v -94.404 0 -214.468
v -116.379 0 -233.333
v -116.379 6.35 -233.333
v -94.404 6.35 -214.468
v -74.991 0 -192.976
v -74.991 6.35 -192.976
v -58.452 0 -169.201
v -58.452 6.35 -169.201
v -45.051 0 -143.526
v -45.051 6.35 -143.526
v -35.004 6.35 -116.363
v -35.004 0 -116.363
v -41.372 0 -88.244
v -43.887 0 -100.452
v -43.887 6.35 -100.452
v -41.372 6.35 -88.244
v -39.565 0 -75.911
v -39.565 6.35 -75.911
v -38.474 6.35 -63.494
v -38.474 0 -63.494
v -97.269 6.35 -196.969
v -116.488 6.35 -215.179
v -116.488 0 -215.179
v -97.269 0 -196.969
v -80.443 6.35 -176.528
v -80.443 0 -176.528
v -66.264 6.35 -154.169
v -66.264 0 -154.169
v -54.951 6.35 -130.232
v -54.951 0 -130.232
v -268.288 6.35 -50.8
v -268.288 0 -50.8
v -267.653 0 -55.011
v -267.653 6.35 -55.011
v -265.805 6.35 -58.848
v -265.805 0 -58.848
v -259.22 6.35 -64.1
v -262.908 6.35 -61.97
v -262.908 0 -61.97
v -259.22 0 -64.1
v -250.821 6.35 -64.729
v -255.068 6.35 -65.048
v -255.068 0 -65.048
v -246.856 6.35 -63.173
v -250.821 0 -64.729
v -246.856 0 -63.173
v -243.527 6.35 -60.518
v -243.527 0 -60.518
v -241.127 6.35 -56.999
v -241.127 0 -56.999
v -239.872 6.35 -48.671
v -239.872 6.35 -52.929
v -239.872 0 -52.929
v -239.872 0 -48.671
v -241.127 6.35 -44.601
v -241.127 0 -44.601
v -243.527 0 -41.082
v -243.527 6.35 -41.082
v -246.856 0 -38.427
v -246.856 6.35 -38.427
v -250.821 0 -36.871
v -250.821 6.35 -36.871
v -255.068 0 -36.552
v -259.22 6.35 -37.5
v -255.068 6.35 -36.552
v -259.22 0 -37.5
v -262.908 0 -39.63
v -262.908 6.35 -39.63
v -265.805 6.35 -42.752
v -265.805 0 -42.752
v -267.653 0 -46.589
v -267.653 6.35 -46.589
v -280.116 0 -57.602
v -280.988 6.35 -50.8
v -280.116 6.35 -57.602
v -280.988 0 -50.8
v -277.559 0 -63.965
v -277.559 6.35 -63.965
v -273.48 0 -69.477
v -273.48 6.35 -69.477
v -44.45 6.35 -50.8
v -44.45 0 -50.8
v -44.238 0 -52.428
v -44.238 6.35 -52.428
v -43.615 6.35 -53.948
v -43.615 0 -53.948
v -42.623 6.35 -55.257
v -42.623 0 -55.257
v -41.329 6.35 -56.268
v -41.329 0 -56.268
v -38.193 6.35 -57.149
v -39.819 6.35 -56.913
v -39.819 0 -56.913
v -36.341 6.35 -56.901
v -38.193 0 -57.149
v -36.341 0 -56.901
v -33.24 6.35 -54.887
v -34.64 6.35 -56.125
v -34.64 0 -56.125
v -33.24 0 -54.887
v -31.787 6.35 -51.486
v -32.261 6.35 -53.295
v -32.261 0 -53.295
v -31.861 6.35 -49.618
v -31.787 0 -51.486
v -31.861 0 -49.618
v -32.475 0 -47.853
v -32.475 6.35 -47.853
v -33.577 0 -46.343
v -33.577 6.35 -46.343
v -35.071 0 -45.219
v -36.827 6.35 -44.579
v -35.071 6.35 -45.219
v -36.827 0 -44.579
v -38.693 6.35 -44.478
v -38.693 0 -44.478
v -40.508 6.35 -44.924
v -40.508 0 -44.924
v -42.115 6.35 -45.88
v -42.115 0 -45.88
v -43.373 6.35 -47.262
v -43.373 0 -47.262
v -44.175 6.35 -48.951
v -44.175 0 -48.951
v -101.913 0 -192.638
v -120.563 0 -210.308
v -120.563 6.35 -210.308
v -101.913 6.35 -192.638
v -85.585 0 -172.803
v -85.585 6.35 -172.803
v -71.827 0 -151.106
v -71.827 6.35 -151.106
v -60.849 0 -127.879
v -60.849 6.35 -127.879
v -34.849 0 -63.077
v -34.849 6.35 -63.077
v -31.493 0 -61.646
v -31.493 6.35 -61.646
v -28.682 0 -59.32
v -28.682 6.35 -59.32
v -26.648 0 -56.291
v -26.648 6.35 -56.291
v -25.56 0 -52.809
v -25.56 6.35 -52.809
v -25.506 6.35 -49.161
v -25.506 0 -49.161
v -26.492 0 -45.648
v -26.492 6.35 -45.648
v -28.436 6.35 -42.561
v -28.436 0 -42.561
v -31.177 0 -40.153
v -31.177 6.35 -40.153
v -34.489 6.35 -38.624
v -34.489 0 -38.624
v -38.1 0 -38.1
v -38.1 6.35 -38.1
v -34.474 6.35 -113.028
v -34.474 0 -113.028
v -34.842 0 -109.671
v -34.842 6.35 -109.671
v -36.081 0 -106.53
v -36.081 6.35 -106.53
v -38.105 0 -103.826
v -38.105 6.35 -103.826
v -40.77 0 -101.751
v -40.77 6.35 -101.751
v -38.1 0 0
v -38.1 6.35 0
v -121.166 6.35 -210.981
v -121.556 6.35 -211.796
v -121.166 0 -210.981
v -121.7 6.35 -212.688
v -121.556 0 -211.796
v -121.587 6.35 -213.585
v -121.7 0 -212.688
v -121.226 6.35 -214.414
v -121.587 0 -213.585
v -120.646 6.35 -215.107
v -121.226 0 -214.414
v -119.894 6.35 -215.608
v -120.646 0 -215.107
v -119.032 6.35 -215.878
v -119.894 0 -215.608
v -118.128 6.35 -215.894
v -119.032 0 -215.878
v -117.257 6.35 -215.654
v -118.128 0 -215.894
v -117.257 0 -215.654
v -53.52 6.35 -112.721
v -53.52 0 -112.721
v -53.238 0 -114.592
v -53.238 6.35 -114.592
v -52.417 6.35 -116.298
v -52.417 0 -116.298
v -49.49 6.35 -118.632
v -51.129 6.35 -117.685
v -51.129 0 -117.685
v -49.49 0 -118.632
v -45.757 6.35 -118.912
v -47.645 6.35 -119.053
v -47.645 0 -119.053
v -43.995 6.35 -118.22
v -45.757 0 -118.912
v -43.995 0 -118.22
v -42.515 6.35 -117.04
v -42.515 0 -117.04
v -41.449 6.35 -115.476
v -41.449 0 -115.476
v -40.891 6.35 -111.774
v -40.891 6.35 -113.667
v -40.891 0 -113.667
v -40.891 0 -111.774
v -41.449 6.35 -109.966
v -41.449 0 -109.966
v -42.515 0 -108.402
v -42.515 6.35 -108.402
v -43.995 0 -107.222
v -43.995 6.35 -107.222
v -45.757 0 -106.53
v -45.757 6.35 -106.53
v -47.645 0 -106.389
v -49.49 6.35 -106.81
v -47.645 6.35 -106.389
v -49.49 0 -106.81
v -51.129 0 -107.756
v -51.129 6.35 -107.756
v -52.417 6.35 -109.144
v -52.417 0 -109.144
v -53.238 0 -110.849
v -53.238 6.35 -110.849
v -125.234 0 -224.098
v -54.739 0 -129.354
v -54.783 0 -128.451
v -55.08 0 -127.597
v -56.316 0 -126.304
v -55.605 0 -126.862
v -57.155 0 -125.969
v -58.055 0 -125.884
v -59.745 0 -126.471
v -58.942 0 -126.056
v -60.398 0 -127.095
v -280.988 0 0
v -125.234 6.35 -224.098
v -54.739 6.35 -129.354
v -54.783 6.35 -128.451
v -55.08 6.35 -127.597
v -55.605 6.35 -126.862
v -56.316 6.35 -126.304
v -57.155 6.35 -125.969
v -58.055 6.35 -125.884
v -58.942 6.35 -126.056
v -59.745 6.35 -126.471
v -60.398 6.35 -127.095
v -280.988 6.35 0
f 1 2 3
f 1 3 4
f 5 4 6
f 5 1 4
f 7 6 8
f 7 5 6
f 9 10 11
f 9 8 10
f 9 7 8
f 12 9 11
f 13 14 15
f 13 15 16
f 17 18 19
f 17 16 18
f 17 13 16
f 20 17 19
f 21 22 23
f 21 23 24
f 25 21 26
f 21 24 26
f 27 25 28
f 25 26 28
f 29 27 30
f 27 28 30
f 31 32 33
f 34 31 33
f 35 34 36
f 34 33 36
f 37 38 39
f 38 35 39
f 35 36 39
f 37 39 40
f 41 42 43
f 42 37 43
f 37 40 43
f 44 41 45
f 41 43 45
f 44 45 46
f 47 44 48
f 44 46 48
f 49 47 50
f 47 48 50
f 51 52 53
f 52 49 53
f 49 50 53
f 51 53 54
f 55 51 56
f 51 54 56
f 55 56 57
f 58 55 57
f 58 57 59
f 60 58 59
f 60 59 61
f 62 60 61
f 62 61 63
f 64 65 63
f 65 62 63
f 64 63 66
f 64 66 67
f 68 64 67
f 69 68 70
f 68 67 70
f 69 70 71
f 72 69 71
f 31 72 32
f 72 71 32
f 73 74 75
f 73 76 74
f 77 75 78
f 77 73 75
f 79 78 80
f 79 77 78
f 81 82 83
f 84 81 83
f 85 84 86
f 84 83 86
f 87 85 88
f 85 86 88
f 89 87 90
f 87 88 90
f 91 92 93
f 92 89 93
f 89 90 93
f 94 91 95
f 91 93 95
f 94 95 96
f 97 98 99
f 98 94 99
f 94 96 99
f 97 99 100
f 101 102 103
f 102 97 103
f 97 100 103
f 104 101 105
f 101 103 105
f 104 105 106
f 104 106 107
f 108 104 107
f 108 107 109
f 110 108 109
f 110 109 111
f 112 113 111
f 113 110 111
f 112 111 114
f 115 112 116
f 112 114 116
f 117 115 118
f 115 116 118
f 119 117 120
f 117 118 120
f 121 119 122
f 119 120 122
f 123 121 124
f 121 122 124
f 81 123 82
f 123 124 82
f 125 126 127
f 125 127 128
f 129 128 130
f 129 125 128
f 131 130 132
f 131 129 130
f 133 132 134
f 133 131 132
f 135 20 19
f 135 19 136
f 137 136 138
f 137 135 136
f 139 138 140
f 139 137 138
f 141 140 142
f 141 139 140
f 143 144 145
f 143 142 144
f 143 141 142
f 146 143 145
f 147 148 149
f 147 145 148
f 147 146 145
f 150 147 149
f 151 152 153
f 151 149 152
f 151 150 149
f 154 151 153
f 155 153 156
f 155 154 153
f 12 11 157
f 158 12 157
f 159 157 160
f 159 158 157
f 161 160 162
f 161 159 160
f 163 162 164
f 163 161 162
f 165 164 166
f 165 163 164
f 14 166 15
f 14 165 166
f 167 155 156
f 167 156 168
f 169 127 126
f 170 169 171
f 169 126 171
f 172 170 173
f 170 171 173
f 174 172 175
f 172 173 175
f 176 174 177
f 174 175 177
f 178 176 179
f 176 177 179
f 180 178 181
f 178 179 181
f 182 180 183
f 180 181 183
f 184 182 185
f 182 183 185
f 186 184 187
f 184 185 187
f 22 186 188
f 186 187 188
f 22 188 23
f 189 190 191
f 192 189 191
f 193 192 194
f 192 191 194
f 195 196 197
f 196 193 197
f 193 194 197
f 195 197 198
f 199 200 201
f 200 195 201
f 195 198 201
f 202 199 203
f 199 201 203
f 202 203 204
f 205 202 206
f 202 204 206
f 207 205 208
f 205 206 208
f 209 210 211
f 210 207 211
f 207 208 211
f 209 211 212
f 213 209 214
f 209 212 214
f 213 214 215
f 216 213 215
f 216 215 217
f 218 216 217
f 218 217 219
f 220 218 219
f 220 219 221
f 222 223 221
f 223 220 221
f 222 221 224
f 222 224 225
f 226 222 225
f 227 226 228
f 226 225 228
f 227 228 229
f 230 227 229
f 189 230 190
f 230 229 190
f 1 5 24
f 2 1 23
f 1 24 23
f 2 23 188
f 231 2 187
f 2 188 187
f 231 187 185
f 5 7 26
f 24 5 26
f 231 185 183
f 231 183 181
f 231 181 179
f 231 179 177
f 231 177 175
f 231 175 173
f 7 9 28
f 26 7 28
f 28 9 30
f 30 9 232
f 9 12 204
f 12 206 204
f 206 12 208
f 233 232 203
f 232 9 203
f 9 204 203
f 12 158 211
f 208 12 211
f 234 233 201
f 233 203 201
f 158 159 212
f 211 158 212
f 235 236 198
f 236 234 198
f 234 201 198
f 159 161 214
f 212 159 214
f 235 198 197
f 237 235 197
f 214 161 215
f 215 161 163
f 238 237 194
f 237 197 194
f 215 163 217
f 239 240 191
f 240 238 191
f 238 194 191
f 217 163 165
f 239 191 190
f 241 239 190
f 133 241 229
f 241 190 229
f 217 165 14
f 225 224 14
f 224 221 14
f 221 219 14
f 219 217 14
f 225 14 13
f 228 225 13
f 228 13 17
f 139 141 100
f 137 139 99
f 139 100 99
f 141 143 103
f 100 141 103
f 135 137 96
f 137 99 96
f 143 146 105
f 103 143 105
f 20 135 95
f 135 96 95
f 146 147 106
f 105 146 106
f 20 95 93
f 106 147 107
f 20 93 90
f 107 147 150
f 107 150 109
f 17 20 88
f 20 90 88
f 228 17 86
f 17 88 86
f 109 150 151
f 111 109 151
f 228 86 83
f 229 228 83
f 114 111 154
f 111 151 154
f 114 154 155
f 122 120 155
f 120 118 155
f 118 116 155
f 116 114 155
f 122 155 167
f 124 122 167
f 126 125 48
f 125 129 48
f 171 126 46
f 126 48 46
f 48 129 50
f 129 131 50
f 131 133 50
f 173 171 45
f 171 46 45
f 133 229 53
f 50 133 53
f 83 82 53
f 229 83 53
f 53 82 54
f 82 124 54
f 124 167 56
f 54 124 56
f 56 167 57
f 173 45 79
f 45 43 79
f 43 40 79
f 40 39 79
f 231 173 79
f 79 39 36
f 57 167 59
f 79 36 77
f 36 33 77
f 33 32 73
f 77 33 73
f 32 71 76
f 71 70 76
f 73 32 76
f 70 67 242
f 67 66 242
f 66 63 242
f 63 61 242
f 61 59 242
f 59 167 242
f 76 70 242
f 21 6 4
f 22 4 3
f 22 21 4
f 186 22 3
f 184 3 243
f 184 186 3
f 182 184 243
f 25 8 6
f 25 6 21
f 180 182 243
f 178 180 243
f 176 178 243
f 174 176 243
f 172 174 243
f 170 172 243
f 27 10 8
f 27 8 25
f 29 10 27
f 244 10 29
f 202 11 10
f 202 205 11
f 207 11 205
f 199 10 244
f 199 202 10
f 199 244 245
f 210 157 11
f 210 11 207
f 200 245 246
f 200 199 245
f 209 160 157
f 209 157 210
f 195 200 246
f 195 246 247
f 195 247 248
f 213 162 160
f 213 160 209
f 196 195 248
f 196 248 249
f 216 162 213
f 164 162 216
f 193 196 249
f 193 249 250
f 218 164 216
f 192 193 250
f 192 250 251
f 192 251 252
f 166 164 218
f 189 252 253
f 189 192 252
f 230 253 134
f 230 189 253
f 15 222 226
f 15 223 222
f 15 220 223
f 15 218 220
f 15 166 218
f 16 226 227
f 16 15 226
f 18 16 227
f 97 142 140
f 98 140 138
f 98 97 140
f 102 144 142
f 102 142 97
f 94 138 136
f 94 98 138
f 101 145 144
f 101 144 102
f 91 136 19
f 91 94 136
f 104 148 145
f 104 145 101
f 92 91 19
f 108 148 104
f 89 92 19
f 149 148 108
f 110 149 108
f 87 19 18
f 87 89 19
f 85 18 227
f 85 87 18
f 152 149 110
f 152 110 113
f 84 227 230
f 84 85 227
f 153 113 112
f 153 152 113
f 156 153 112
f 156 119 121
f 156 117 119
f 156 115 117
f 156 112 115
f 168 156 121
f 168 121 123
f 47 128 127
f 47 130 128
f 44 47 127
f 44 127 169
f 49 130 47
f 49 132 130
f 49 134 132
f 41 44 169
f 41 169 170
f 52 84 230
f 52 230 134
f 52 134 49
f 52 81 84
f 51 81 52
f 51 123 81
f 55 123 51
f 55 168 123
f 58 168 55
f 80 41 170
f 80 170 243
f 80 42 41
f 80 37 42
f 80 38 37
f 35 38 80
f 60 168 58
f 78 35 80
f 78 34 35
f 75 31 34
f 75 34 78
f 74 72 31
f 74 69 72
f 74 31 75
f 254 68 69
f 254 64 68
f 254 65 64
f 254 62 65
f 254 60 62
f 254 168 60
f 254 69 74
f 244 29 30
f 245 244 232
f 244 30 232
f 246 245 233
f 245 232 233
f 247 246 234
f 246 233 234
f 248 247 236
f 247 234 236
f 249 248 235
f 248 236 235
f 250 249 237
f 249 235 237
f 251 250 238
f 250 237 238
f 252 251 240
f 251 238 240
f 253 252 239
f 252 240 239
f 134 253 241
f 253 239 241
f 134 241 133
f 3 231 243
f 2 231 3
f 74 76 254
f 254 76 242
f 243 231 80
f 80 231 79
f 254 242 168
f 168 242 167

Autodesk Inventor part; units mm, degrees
ref_plane "YZ Plane" through (0, 0, 0) normal (1, 0, 0) x (0, 1, 0)
ref_plane "XZ Plane" through (0, 0, 0) normal (0, 1, 0) x (-1, 0, 0)
sketch "Sketch1" plane through (0, 0, 0) normal (0, 1, 0) x (-1, 0, 0)
  circle A0 centre (254, -50.8) radius 14.2875
  arc A1 (38.4735, -38.1055) -> (38.4735, -63.4945) centre (38.1, -50.8) ccw
  line L0 (280.9875, -50.8) -> (280.9875, 0)
  line L1 (280.9875, 0) -> (280.9875, -50.8)
  line L2 (280.9875, 0) -> (38.1, 0)
  line L3 (38.1, -38.1) -> (38.1, 0)
  arc A2 (38.4735, -63.4945) -> (43.8871, -100.4525) centre (254, -50.8) ccw
  arc A3 (51.1687, -124.7749) -> (66.9545, -158.6276) centre (254, -50.8) ccw
  arc A4 (80.906, -179.8398) -> (105.7377, -207.743) centre (254, -50.8) ccw
  arc A5 (273.4803, -69.4773) -> (280.9875, -50.8) centre (254, -50.8) ccw
  line L4 (125.2338, -224.0976) -> (273.4803, -69.4773)
  line L5 (280.9875, 0) -> (38.1, 0)
  line L6 (38.1, 0) -> (38.1, -38.1)
  line L7 (280.9875, 0) -> (280.9875, -50.8)
  circle A6 centre (47.1701, -112.7208) radius 6.35
  circle A7 centre (38.1, -50.8) radius 6.35
  arc A8 (43.8871, -100.4525) -> (51.1687, -124.7749) centre (47.1701, -112.7208) ccw
  arc A9 (38.4735, -38.1055) -> (38.4735, -63.4945) centre (38.1, -50.8) ccw
  arc A10 (43.8871, -100.4525) -> (51.1687, -124.7749) centre (47.1701, -112.7208) ccw
  line L8 (38.1, 0) -> (50.8, 0)
  line L9 (38.4739, -38.1) -> (38.1, -38.1)
  line L10 (38.1, -38.1) -> (38.1, 0)
  circle A11 centre (254, -50.8) radius 14.2875
  circle A12 centre (47.1701, -112.7208) radius 6.35
  circle A13 centre (38.1, -50.8) radius 6.35
  arc A14 (51.1687, -124.7749) -> (125.2338, -224.0976) centre (254, -50.8) ccw
  arc A15 (38.1934, -57.1493) -> (43.8871, -100.4525) centre (254, -50.8) ccw
  arc A16 (35.0036, -116.3632) -> (116.3789, -233.3332) centre (254, -50.8) ccw
  line L11 (125.2338, -224.0976) -> (116.3789, -233.3332)
  point P0 (0, 0)
  point P1 (44.1616, 0)
  point P2 (38.1934, -44.4507)
  dimension "d4" = 28.575
  dimension "d32" = 25.4
  dimension "d36" = 50.8
  dimension "d74" = 53.975
  dimension "d79" = 12.7
  dimension "d83" = 26.9875
ref_plane "Work Plane1" through (0, 6.35, 0) normal (0, 1, 0) x (1, 0, 0)
extrude "Extrusion7" add sketch "Sketch1" along normal blind 6.35
sketch "Sketch3" plane through (0, 0, 0) normal (0, -1, 0) x (1, 0, 0)
  circle A0 centre (-254, -50.8) radius 14.2875 projected
  circle A1 centre (-254, -50.8) radius 14.2875
  arc A2 (-116.3789, -233.3332) -> (-35.0036, -116.3632) centre (-254, -50.8) ccw projected
  circle A3 centre (-47.1701, -112.7208) radius 6.35 projected
  arc A4 (-130.7722, -218.3211) -> (-55.5923, -113.1119) centre (-254, -50.8) ccw
  circle A5 centre (-254, -50.8) radius 24.789
  arc A6 (-126.3412, -222.9426) -> (-47.018, -106.3726) centre (-254, -50.8) ccw
  arc A7 (-54.9513, -130.2322) -> (-60.849, -127.8786) centre (-57.9002, -129.0554) ccw
  line L0 (-62.5231, -105.8831) -> (-35.6006, -133.9631)
  line L1 (-116.3789, -233.3332) -> (-273.4803, -69.4773) projected
  arc A8 (-120.5628, -210.3083) -> (-116.4883, -215.1788) centre (-118.5256, -212.7436) ccw
  arc A9 (-56.7456, -126.0977) -> (-50.5804, -107.3643) centre (-254, -50.8) ccw
  arc A10 (-128.5564, -220.6321) -> (-120.976, -214.7624) centre (-254, -50.8) ccw
  point P0 (0, 0)
  dimension "d90" = 415.925
  dimension "d94" = 428.625
  dimension "d97" = 6.35
  dimension "d98" = 6.35
  dimension "d101" = 12.7
  dimension "d102" = 6.35
  dimension "d103" = 12.7
extrude "Extrusion8" cut sketch "Sketch3" against normal blind 127 contours A8 A4 A7 A6
sketch "Sketch7" plane through (0, 0, 0) normal (0, -1, 0) x (1, 0, 0)
  line L0 (-280.9875, 0) -> (-38.1, 0) projected
  line L1 (-217.4875, 0) -> (-369.8875, 0)
  line L2 (-369.8875, 0) -> (-369.8875, -101.6)
  line L3 (-369.8875, -101.6) -> (-217.4875, -101.6)
  line L4 (-217.4875, -101.6) -> (-217.4875, 0)
  line L5 (-280.9875, -50.8) -> (-280.9875, 0) projected
  line L6 (-116.3789, -233.3332) -> (-273.4803, -69.4773) projected
  line L7 (-242.6818, -101.6) -> (-276.2977, -52.4082)
  line L8 (-276.2977, -52.4082) -> (-253.5984, 0)
  circle A0 centre (-254, -50.8) radius 14.2875 projected
  circle A1 centre (-254, -50.8) radius 14.2875
  line L9 (-280.9875, 0) -> (-217.4875, 0)
  line L10 (-217.4875, 0) -> (-217.4875, 104.2647)
  line L11 (-217.4875, 104.2647) -> (-280.9875, 104.2647)
  line L12 (-280.9875, 104.2647) -> (-280.9875, 0)
  circle A2 centre (-254, -50.8) radius 76.2
  circle A3 centre (-47.1701, -112.7208) radius 6.35 projected
  line L13 (-254, -50.8) -> (-71.9918, -151.4053)
  arc A4 (-120.5628, -210.3083) -> (-60.849, -127.8786) centre (-254, -50.8) ccw projected
  point P0 (0, 0)
  dimension "d111" = 63.5
  dimension "d112" = 101.6
  dimension "d113" = 152.4
  dimension "d114" = 115.8875
  dimension "d115" = 152.4
  dimension "d118" = 207.9625
sketch "Sketch8" plane through (0, 0, 0) normal (0, -1, 0) x (1, 0, 0)
  point P0 (0, 0)
properties part number "Hood panel RIGHT" material "Aluminum 6061"
